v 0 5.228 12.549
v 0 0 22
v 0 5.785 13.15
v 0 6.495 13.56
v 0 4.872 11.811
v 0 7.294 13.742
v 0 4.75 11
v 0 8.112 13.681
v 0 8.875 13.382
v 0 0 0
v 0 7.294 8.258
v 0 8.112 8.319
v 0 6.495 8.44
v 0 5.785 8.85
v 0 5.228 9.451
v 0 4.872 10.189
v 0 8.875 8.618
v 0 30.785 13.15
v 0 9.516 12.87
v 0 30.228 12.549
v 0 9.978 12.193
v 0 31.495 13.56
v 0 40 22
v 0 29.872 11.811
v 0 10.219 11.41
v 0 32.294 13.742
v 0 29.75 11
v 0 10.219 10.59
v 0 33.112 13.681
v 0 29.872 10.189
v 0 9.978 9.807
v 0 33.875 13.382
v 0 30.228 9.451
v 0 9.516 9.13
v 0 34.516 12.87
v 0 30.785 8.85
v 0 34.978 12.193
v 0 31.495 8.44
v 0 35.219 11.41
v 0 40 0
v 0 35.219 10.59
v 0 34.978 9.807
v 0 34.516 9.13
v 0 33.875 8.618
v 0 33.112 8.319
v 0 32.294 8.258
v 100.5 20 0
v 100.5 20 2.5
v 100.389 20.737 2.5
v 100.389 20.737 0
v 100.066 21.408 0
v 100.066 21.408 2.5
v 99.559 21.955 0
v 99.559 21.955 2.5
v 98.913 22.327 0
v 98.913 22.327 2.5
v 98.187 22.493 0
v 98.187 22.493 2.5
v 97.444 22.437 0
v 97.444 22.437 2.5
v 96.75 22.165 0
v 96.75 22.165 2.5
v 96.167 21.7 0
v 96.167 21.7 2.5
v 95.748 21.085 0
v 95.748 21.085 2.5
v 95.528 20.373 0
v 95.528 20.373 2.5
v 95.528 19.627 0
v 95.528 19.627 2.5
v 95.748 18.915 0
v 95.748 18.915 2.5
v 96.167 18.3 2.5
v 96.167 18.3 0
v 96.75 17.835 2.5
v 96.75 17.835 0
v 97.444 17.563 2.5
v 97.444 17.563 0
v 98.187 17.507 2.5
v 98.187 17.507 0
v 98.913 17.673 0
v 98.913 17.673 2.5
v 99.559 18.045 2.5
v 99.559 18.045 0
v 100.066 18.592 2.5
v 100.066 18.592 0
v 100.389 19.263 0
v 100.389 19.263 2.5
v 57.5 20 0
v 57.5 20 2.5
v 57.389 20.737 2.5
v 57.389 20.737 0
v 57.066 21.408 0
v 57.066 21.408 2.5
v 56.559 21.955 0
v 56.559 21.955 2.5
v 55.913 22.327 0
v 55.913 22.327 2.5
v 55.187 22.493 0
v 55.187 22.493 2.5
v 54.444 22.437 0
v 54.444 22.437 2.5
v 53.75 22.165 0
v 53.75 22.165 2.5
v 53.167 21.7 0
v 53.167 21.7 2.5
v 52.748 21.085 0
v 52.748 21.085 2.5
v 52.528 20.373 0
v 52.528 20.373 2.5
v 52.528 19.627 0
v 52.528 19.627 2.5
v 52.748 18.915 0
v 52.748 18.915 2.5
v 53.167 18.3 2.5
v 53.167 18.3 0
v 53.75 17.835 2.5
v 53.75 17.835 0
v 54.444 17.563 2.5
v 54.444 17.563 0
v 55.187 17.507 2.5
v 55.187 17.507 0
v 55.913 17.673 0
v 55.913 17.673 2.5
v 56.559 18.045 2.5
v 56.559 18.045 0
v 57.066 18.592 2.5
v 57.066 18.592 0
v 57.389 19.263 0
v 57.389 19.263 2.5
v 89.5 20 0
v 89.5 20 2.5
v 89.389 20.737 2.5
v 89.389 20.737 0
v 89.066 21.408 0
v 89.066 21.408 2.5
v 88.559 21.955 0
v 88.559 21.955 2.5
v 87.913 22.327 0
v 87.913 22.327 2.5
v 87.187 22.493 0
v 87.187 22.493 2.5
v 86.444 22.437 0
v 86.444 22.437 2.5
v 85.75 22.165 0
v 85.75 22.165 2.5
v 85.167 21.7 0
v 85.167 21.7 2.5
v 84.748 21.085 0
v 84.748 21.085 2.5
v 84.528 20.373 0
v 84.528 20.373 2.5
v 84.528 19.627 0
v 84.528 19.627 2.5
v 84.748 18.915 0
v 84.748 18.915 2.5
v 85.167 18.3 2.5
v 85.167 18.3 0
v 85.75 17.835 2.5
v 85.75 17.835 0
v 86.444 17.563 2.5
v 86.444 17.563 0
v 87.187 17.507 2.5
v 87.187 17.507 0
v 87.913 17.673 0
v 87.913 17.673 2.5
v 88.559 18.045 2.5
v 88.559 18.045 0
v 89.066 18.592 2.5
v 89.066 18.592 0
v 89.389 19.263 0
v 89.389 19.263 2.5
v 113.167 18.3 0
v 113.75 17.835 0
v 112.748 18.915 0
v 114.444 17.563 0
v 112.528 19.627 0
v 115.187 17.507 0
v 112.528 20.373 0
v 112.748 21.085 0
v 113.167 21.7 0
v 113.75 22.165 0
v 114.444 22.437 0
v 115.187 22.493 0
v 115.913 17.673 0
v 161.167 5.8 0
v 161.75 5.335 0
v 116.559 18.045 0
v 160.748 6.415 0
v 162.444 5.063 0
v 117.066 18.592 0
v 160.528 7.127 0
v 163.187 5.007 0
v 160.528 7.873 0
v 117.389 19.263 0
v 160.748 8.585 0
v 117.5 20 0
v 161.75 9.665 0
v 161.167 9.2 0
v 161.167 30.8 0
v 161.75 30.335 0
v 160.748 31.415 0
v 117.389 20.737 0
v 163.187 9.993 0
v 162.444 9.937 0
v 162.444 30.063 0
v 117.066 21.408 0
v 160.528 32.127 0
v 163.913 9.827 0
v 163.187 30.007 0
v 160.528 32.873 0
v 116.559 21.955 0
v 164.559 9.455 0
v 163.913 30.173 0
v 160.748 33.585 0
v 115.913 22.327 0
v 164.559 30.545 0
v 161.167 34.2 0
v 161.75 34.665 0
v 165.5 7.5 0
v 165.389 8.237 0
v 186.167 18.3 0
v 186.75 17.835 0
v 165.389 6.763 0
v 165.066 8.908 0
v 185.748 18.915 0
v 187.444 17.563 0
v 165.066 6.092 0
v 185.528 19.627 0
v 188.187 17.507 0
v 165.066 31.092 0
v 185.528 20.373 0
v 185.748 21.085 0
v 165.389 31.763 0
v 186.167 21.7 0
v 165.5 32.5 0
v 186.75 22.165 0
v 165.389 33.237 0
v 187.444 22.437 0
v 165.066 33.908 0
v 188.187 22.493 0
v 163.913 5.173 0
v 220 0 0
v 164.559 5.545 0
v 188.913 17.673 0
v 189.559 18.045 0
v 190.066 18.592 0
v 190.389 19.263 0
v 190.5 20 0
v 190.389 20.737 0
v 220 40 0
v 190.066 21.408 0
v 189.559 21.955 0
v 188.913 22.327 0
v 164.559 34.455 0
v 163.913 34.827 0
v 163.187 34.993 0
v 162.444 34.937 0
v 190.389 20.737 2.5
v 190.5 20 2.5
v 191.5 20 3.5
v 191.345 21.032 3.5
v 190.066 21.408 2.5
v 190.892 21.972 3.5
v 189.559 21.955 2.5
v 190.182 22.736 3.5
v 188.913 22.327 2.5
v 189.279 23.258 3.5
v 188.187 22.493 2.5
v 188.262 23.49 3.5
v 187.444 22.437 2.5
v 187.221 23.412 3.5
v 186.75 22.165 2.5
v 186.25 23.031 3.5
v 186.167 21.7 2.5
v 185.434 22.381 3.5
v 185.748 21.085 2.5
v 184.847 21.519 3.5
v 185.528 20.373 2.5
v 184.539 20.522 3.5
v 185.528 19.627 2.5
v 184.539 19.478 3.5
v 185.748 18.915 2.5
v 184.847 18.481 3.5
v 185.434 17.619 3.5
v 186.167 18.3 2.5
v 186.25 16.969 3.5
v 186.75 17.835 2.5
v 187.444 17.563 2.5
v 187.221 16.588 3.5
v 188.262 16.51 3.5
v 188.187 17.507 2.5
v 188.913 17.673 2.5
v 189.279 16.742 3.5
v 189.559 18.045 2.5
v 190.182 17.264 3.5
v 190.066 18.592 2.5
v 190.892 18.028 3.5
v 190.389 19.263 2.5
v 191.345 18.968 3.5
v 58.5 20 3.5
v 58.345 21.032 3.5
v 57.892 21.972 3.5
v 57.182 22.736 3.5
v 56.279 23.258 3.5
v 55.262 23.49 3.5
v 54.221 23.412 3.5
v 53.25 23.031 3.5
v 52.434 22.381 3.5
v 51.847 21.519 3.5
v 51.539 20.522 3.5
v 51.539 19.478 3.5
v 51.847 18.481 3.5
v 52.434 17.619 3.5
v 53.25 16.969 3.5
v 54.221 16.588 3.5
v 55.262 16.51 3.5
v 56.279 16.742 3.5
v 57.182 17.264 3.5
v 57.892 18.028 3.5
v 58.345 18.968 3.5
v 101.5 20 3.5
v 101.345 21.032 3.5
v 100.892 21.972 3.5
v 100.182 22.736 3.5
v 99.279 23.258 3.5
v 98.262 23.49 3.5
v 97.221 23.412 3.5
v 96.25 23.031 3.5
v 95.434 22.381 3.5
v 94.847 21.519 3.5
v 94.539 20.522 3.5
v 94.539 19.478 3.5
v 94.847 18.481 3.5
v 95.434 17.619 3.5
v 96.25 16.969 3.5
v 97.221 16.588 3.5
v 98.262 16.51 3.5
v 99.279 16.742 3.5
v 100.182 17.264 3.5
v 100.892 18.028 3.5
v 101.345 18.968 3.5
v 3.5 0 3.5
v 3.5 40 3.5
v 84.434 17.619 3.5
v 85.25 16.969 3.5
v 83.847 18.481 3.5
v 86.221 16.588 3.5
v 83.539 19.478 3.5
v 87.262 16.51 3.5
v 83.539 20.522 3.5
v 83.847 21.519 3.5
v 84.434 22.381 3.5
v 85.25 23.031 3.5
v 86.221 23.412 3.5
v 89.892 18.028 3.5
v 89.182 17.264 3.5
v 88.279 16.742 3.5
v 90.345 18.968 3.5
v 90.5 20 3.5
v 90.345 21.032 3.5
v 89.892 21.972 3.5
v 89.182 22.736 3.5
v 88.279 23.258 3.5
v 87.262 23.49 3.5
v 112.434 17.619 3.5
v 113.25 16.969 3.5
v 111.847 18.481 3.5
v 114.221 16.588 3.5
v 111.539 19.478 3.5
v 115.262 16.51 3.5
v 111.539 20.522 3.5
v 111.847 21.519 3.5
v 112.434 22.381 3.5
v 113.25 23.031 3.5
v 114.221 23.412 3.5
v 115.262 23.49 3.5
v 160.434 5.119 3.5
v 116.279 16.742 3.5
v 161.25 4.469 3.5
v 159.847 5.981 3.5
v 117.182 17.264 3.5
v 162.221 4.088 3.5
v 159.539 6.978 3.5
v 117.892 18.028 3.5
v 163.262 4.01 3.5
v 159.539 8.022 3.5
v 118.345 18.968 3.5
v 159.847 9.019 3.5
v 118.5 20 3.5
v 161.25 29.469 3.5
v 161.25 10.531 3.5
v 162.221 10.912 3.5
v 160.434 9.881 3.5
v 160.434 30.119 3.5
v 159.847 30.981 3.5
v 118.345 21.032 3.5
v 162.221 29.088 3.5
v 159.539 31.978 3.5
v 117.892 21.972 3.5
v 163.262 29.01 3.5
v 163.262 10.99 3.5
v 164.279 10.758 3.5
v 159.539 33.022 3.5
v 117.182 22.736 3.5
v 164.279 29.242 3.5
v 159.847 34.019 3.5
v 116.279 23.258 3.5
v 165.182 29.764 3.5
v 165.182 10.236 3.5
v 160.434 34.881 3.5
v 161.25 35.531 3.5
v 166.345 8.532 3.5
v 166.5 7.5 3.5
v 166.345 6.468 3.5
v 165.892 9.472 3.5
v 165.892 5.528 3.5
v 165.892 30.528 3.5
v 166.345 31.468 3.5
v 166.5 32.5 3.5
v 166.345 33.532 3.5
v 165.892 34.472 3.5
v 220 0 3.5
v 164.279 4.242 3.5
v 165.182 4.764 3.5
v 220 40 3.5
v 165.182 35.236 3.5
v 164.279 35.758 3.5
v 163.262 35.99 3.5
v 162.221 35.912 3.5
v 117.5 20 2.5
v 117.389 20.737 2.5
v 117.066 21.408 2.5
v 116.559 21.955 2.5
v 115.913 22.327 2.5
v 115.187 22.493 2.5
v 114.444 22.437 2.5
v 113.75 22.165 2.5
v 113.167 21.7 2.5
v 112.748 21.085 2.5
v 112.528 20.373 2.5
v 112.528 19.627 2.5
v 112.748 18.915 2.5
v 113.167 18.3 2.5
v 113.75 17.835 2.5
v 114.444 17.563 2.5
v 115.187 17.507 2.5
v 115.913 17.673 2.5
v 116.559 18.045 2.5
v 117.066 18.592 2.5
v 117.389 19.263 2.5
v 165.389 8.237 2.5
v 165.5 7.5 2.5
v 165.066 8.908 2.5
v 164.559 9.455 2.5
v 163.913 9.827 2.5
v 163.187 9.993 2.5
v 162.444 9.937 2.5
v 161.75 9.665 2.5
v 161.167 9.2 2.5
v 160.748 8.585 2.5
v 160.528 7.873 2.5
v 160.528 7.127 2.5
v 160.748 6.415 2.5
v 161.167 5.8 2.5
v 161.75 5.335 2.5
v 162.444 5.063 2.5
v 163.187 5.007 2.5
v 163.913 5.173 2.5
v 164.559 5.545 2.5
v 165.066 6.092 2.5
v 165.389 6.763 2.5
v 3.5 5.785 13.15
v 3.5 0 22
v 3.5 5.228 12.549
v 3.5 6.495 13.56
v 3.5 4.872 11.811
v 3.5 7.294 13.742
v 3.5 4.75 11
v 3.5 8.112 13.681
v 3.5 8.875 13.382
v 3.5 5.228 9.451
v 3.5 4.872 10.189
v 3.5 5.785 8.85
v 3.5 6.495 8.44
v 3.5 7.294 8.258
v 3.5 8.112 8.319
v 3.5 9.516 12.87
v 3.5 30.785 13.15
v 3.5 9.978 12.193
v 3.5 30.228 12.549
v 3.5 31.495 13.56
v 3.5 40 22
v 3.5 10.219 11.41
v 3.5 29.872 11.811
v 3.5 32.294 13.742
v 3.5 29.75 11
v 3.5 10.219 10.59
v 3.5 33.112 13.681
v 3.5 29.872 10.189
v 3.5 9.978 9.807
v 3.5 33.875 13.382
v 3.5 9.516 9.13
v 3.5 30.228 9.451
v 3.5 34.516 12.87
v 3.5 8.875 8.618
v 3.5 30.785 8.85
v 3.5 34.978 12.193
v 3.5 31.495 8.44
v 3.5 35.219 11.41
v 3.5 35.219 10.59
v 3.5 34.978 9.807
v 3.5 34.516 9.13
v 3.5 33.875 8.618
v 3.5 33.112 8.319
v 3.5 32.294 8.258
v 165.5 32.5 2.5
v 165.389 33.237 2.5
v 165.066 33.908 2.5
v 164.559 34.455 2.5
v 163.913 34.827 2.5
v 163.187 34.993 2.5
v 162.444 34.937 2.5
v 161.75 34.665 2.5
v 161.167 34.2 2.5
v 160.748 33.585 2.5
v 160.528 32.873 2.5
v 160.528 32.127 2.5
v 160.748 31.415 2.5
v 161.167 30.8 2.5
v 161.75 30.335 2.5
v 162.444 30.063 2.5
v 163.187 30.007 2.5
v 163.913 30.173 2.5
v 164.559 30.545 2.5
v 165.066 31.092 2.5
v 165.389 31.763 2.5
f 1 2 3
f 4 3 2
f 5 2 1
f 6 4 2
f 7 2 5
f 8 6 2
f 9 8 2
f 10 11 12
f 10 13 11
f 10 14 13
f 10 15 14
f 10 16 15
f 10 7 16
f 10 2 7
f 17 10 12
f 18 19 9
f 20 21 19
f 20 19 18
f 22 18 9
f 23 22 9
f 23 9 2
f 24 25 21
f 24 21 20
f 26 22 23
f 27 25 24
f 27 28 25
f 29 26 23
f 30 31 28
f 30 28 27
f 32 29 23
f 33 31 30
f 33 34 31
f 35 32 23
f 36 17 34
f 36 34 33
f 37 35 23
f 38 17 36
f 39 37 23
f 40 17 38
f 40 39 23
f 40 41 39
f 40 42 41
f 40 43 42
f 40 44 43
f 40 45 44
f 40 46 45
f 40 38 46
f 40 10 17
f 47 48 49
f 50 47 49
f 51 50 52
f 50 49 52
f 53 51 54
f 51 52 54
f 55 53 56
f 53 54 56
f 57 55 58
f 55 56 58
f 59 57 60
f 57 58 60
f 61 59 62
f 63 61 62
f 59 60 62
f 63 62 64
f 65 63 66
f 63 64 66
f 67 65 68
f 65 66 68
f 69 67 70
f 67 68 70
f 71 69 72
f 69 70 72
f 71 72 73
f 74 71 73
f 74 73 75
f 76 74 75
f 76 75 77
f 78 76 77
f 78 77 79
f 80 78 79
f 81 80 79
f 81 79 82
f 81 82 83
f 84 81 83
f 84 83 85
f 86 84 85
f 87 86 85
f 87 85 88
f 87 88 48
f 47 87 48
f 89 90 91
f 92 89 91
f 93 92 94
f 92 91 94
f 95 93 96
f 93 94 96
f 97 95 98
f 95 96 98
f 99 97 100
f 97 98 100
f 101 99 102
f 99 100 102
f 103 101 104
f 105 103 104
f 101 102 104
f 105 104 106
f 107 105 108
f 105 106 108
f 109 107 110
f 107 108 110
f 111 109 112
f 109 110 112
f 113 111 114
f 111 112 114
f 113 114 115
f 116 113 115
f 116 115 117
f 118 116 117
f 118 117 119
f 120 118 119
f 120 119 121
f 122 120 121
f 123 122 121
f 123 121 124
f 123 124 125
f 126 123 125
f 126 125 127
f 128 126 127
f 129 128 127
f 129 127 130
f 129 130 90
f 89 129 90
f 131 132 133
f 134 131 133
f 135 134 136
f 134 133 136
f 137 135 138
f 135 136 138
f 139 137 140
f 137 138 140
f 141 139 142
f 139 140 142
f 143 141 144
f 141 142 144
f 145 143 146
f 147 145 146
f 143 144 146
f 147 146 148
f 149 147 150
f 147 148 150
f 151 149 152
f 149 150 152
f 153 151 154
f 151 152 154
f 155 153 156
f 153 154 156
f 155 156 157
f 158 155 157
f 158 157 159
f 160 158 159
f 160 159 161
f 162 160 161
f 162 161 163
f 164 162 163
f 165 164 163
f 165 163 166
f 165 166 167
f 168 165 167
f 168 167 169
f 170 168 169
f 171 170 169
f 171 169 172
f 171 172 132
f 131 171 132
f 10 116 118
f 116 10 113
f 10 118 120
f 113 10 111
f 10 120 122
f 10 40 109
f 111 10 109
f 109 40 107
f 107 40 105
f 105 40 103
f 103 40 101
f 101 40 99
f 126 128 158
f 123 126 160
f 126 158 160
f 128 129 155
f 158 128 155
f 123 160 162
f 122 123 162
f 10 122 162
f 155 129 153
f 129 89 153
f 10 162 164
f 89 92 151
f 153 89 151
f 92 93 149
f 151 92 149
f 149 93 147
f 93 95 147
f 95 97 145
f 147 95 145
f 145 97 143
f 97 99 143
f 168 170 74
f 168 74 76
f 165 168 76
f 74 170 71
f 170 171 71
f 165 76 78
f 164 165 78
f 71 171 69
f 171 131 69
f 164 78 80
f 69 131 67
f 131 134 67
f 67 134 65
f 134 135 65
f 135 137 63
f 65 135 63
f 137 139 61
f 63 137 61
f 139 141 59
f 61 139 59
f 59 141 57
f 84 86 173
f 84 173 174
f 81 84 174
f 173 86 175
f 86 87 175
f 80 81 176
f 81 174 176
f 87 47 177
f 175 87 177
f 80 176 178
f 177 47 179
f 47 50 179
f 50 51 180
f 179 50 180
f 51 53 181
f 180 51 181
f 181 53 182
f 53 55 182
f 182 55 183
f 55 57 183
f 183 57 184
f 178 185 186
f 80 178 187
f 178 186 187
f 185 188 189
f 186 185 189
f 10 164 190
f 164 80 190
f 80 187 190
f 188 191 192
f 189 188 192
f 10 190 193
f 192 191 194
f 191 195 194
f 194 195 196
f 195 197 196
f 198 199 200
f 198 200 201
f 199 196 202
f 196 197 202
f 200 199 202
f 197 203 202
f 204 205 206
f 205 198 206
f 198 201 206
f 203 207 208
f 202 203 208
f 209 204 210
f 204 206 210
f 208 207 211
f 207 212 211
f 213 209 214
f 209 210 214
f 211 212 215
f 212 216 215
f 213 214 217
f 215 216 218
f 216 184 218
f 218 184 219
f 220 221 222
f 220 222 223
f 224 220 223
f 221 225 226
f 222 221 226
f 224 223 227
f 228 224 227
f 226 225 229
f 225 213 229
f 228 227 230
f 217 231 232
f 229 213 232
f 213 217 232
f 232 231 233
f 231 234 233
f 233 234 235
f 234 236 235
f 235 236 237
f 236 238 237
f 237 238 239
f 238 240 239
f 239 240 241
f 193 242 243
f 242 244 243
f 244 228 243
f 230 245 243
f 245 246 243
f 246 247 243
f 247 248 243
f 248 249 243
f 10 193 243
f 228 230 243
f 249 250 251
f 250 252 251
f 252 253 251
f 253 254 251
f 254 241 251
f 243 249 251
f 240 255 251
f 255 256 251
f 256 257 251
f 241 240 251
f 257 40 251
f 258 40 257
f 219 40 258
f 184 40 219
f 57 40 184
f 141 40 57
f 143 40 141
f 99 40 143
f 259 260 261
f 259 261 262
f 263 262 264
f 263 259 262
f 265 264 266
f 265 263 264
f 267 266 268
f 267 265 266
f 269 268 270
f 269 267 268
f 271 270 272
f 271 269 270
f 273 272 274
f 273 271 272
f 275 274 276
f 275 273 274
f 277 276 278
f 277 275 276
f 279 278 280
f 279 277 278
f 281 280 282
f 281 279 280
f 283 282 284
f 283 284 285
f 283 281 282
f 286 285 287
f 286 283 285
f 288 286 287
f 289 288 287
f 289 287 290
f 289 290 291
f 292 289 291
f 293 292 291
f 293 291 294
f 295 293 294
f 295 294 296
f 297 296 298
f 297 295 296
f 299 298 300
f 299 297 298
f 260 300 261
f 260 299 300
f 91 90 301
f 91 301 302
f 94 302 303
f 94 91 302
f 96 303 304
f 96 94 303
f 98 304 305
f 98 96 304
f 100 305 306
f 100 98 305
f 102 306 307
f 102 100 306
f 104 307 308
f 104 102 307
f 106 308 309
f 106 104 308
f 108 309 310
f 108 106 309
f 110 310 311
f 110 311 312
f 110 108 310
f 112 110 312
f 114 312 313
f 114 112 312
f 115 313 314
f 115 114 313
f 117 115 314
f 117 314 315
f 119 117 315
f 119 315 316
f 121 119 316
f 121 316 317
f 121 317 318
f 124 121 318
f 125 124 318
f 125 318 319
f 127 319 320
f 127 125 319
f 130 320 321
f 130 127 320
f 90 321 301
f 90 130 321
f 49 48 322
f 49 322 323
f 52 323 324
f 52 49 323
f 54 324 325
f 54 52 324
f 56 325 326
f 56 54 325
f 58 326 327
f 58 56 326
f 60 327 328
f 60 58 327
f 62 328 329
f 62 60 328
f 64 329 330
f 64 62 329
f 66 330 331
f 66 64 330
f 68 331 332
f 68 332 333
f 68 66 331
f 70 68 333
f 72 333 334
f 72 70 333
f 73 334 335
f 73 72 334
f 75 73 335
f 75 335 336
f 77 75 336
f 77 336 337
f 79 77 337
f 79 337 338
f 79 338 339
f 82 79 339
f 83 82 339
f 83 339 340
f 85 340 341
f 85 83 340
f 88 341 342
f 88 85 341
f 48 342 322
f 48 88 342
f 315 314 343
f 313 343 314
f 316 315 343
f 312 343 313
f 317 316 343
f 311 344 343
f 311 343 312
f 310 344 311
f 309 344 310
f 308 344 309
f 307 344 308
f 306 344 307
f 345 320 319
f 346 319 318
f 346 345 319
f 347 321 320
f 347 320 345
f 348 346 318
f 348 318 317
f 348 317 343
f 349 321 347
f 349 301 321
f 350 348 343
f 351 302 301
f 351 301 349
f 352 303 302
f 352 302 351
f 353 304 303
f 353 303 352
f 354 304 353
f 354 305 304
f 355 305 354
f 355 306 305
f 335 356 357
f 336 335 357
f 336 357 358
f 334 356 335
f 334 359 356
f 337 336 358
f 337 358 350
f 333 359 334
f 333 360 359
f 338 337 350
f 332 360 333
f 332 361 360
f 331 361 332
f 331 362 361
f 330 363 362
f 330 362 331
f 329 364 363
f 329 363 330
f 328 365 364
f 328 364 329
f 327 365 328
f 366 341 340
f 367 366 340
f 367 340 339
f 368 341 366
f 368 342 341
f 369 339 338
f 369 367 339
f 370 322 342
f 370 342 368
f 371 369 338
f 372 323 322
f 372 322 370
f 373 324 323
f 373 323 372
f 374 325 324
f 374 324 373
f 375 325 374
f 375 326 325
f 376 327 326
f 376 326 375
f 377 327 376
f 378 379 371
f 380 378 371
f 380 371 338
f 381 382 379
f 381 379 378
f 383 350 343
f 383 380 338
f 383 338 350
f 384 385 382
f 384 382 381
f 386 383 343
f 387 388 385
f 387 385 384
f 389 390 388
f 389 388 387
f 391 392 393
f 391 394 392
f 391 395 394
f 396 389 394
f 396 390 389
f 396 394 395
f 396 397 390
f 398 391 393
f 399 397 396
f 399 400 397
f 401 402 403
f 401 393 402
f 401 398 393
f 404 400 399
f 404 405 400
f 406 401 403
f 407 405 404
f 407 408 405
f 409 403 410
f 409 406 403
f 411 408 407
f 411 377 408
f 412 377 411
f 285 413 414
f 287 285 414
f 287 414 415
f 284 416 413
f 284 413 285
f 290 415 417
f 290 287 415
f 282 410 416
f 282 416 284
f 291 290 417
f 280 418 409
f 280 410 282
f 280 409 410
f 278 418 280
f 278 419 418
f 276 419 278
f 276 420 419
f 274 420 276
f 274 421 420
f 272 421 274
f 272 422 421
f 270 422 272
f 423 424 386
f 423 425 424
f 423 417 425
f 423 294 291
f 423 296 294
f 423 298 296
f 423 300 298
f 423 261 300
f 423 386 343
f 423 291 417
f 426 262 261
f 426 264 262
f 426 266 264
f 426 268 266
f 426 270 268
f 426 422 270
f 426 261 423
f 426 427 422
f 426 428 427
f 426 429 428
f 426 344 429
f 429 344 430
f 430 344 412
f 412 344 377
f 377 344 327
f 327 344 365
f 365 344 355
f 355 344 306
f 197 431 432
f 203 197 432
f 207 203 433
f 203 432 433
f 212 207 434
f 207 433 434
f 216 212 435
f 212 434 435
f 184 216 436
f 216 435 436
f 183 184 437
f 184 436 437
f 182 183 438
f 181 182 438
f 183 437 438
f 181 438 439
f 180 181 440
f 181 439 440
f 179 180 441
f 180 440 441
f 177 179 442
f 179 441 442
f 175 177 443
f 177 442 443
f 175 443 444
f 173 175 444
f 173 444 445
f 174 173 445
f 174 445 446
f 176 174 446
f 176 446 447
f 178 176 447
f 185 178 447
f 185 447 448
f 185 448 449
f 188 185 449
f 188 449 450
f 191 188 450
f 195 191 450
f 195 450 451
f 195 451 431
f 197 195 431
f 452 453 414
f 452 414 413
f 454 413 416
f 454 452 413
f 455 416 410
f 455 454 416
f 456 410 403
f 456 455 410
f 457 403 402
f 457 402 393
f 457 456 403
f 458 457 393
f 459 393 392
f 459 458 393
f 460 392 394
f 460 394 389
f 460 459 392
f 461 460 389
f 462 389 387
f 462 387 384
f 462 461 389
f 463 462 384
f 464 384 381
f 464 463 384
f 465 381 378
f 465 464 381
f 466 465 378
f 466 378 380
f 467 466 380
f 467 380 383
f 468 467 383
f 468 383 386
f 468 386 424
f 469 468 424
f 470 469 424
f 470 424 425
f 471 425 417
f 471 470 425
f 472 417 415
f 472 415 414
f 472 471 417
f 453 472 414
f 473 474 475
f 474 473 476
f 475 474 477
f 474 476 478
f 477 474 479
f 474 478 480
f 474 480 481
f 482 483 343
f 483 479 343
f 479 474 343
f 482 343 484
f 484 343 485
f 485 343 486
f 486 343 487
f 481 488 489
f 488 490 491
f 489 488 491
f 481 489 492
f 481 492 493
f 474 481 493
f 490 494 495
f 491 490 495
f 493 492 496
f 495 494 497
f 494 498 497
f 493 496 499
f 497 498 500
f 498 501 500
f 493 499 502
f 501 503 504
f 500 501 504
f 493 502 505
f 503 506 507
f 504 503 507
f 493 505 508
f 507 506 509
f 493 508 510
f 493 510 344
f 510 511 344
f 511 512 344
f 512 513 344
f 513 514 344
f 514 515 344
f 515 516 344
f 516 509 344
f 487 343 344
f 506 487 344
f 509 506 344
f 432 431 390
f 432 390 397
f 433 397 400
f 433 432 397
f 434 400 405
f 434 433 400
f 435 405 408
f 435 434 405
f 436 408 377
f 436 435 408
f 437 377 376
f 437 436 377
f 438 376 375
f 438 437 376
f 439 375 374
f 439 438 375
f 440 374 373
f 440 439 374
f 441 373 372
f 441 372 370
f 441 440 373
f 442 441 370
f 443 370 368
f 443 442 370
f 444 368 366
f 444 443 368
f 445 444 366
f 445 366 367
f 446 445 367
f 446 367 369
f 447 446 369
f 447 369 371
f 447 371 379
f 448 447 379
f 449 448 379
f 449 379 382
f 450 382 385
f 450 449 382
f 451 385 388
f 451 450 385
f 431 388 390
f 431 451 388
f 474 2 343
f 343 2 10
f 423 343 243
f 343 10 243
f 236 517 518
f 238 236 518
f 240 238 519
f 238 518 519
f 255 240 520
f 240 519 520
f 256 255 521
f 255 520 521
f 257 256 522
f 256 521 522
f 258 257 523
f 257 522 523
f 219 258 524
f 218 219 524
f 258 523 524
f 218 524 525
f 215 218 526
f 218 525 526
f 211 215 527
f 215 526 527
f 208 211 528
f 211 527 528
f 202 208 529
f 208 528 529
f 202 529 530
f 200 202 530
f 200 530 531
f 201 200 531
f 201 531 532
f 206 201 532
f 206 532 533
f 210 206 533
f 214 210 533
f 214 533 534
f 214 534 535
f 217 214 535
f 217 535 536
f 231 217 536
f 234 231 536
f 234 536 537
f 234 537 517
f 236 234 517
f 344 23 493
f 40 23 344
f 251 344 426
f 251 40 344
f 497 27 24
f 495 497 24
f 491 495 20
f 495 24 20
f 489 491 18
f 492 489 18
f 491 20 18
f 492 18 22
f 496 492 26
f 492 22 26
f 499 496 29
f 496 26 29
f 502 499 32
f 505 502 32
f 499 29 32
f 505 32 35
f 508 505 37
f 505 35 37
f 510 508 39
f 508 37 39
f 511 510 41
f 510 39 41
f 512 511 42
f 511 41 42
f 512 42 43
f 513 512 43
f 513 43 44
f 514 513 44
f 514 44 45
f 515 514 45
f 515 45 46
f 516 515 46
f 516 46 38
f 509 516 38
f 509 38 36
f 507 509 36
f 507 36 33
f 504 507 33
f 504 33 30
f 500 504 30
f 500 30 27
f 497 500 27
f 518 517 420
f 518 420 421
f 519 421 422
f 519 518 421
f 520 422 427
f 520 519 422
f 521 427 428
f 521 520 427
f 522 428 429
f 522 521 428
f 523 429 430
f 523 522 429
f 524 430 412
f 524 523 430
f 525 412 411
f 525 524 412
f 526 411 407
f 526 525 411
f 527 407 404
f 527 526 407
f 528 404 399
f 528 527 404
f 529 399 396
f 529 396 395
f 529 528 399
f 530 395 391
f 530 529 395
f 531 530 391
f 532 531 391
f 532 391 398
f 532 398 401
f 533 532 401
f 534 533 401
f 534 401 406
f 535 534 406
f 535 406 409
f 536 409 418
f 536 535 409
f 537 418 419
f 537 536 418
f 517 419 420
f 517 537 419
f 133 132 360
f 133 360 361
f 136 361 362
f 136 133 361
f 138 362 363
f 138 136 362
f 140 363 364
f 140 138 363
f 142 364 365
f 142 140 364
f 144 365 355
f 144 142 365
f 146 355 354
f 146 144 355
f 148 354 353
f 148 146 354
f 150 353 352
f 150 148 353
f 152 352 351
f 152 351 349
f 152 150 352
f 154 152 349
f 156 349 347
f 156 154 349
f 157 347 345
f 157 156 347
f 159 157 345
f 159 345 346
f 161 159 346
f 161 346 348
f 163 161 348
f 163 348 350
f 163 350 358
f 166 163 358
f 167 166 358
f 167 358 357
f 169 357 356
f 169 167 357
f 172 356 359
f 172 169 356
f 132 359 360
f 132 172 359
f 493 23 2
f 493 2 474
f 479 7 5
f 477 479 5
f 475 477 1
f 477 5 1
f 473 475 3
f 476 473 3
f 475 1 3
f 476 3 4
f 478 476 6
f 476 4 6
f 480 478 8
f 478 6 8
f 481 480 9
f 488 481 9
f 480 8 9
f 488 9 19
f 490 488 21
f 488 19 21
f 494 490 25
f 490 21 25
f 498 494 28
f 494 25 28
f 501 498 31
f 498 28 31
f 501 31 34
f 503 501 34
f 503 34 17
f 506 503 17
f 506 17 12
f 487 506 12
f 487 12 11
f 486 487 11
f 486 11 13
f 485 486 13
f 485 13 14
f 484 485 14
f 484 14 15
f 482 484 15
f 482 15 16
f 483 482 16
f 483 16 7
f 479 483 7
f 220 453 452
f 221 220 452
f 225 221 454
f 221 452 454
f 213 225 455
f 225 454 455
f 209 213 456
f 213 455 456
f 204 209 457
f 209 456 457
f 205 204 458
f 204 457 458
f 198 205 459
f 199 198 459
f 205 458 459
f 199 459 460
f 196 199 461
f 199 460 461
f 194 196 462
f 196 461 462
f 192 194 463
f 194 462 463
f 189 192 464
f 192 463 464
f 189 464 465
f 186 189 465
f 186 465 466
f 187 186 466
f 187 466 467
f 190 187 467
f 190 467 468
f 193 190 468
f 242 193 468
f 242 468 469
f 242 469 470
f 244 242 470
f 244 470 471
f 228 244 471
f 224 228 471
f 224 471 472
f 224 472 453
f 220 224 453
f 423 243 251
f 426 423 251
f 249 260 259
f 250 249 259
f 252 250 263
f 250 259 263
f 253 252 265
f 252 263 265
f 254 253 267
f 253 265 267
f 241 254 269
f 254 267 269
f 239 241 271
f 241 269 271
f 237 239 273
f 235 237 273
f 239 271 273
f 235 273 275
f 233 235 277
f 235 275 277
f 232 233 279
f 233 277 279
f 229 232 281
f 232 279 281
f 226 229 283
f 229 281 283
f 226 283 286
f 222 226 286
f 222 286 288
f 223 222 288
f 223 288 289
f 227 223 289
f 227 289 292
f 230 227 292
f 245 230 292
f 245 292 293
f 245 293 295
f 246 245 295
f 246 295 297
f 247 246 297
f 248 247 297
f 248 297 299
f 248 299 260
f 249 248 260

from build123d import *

# Parameters (mm, degrees)
SKETCH_W        = 220
SKETCH_H        = 40
PAD_DEPTH       = 3.5
SKETCH001_R     = 2.5
POCKET_DEPTH    = 3.501
CHAMFER_SIZE    = 1
SKETCH002_W     = 3.5
SKETCH002_H     = 40
PAD001_DEPTH    = 18.5
SKETCH003_R     = 2.75
POCKET001_DEPTH = 220.001


with BuildPart() as part:
    # Sketch → Pad (new body)
    with BuildSketch(Plane.XY):
        with Locations((110, 20)):
            Rectangle(SKETCH_W, SKETCH_H)
    extrude(amount=PAD_DEPTH)

    # Sketch001 (on Face6 of Pad) → Pocket (cut, through all)
    with BuildSketch(Plane.XY.offset(3.5)):
        with Locations((55, 20)):
            Circle(SKETCH001_R)
        with Locations((87, 20)):
            Circle(SKETCH001_R)
        with Locations((98, 20)):
            Circle(SKETCH001_R)
        with Locations((115, 20)):
            Circle(SKETCH001_R)
        with Locations((188, 20)):
            Circle(SKETCH001_R)
        with Locations((163, 32.5)):
            Circle(SKETCH001_R)
        with Locations((163, 7.5)):
            Circle(SKETCH001_R)
    extrude(amount=-POCKET_DEPTH, mode=Mode.SUBTRACT)

    # Chamfer
    chamfer_edges = [part.edges().sort_by_distance(p)[0] for p in [
        (52.5, 20, 3.5),
        (84.5, 20, 3.5),
        (95.5, 20, 3.5),
        (112.5, 20, 3.5),
        (160.5, 32.5, 3.5),
        (160.5, 7.5, 3.5),
        (185.5, 20, 3.5),
    ]]
    chamfer(chamfer_edges, length=CHAMFER_SIZE)

    # Sketch002 (on Face1 of Chamfer) → Pad001 (join)
    with BuildSketch(Plane.XY.offset(3.5)):
        with Locations((1.75, 20)):
            Rectangle(SKETCH002_W, SKETCH002_H)
    extrude(amount=PAD001_DEPTH)

    # Sketch003 → Pocket001 (cut, through all)
    with BuildSketch(Plane(origin=(0, 0, 0), x_dir=(0, -1, 0), z_dir=(-1, 0, 0))):
        with Locations((-32.5, 11)):
            Circle(SKETCH003_R)
        with Locations((-7.5, 11)):
            Circle(SKETCH003_R)
    extrude(amount=-POCKET001_DEPTH, mode=Mode.SUBTRACT)


solid = part.part
